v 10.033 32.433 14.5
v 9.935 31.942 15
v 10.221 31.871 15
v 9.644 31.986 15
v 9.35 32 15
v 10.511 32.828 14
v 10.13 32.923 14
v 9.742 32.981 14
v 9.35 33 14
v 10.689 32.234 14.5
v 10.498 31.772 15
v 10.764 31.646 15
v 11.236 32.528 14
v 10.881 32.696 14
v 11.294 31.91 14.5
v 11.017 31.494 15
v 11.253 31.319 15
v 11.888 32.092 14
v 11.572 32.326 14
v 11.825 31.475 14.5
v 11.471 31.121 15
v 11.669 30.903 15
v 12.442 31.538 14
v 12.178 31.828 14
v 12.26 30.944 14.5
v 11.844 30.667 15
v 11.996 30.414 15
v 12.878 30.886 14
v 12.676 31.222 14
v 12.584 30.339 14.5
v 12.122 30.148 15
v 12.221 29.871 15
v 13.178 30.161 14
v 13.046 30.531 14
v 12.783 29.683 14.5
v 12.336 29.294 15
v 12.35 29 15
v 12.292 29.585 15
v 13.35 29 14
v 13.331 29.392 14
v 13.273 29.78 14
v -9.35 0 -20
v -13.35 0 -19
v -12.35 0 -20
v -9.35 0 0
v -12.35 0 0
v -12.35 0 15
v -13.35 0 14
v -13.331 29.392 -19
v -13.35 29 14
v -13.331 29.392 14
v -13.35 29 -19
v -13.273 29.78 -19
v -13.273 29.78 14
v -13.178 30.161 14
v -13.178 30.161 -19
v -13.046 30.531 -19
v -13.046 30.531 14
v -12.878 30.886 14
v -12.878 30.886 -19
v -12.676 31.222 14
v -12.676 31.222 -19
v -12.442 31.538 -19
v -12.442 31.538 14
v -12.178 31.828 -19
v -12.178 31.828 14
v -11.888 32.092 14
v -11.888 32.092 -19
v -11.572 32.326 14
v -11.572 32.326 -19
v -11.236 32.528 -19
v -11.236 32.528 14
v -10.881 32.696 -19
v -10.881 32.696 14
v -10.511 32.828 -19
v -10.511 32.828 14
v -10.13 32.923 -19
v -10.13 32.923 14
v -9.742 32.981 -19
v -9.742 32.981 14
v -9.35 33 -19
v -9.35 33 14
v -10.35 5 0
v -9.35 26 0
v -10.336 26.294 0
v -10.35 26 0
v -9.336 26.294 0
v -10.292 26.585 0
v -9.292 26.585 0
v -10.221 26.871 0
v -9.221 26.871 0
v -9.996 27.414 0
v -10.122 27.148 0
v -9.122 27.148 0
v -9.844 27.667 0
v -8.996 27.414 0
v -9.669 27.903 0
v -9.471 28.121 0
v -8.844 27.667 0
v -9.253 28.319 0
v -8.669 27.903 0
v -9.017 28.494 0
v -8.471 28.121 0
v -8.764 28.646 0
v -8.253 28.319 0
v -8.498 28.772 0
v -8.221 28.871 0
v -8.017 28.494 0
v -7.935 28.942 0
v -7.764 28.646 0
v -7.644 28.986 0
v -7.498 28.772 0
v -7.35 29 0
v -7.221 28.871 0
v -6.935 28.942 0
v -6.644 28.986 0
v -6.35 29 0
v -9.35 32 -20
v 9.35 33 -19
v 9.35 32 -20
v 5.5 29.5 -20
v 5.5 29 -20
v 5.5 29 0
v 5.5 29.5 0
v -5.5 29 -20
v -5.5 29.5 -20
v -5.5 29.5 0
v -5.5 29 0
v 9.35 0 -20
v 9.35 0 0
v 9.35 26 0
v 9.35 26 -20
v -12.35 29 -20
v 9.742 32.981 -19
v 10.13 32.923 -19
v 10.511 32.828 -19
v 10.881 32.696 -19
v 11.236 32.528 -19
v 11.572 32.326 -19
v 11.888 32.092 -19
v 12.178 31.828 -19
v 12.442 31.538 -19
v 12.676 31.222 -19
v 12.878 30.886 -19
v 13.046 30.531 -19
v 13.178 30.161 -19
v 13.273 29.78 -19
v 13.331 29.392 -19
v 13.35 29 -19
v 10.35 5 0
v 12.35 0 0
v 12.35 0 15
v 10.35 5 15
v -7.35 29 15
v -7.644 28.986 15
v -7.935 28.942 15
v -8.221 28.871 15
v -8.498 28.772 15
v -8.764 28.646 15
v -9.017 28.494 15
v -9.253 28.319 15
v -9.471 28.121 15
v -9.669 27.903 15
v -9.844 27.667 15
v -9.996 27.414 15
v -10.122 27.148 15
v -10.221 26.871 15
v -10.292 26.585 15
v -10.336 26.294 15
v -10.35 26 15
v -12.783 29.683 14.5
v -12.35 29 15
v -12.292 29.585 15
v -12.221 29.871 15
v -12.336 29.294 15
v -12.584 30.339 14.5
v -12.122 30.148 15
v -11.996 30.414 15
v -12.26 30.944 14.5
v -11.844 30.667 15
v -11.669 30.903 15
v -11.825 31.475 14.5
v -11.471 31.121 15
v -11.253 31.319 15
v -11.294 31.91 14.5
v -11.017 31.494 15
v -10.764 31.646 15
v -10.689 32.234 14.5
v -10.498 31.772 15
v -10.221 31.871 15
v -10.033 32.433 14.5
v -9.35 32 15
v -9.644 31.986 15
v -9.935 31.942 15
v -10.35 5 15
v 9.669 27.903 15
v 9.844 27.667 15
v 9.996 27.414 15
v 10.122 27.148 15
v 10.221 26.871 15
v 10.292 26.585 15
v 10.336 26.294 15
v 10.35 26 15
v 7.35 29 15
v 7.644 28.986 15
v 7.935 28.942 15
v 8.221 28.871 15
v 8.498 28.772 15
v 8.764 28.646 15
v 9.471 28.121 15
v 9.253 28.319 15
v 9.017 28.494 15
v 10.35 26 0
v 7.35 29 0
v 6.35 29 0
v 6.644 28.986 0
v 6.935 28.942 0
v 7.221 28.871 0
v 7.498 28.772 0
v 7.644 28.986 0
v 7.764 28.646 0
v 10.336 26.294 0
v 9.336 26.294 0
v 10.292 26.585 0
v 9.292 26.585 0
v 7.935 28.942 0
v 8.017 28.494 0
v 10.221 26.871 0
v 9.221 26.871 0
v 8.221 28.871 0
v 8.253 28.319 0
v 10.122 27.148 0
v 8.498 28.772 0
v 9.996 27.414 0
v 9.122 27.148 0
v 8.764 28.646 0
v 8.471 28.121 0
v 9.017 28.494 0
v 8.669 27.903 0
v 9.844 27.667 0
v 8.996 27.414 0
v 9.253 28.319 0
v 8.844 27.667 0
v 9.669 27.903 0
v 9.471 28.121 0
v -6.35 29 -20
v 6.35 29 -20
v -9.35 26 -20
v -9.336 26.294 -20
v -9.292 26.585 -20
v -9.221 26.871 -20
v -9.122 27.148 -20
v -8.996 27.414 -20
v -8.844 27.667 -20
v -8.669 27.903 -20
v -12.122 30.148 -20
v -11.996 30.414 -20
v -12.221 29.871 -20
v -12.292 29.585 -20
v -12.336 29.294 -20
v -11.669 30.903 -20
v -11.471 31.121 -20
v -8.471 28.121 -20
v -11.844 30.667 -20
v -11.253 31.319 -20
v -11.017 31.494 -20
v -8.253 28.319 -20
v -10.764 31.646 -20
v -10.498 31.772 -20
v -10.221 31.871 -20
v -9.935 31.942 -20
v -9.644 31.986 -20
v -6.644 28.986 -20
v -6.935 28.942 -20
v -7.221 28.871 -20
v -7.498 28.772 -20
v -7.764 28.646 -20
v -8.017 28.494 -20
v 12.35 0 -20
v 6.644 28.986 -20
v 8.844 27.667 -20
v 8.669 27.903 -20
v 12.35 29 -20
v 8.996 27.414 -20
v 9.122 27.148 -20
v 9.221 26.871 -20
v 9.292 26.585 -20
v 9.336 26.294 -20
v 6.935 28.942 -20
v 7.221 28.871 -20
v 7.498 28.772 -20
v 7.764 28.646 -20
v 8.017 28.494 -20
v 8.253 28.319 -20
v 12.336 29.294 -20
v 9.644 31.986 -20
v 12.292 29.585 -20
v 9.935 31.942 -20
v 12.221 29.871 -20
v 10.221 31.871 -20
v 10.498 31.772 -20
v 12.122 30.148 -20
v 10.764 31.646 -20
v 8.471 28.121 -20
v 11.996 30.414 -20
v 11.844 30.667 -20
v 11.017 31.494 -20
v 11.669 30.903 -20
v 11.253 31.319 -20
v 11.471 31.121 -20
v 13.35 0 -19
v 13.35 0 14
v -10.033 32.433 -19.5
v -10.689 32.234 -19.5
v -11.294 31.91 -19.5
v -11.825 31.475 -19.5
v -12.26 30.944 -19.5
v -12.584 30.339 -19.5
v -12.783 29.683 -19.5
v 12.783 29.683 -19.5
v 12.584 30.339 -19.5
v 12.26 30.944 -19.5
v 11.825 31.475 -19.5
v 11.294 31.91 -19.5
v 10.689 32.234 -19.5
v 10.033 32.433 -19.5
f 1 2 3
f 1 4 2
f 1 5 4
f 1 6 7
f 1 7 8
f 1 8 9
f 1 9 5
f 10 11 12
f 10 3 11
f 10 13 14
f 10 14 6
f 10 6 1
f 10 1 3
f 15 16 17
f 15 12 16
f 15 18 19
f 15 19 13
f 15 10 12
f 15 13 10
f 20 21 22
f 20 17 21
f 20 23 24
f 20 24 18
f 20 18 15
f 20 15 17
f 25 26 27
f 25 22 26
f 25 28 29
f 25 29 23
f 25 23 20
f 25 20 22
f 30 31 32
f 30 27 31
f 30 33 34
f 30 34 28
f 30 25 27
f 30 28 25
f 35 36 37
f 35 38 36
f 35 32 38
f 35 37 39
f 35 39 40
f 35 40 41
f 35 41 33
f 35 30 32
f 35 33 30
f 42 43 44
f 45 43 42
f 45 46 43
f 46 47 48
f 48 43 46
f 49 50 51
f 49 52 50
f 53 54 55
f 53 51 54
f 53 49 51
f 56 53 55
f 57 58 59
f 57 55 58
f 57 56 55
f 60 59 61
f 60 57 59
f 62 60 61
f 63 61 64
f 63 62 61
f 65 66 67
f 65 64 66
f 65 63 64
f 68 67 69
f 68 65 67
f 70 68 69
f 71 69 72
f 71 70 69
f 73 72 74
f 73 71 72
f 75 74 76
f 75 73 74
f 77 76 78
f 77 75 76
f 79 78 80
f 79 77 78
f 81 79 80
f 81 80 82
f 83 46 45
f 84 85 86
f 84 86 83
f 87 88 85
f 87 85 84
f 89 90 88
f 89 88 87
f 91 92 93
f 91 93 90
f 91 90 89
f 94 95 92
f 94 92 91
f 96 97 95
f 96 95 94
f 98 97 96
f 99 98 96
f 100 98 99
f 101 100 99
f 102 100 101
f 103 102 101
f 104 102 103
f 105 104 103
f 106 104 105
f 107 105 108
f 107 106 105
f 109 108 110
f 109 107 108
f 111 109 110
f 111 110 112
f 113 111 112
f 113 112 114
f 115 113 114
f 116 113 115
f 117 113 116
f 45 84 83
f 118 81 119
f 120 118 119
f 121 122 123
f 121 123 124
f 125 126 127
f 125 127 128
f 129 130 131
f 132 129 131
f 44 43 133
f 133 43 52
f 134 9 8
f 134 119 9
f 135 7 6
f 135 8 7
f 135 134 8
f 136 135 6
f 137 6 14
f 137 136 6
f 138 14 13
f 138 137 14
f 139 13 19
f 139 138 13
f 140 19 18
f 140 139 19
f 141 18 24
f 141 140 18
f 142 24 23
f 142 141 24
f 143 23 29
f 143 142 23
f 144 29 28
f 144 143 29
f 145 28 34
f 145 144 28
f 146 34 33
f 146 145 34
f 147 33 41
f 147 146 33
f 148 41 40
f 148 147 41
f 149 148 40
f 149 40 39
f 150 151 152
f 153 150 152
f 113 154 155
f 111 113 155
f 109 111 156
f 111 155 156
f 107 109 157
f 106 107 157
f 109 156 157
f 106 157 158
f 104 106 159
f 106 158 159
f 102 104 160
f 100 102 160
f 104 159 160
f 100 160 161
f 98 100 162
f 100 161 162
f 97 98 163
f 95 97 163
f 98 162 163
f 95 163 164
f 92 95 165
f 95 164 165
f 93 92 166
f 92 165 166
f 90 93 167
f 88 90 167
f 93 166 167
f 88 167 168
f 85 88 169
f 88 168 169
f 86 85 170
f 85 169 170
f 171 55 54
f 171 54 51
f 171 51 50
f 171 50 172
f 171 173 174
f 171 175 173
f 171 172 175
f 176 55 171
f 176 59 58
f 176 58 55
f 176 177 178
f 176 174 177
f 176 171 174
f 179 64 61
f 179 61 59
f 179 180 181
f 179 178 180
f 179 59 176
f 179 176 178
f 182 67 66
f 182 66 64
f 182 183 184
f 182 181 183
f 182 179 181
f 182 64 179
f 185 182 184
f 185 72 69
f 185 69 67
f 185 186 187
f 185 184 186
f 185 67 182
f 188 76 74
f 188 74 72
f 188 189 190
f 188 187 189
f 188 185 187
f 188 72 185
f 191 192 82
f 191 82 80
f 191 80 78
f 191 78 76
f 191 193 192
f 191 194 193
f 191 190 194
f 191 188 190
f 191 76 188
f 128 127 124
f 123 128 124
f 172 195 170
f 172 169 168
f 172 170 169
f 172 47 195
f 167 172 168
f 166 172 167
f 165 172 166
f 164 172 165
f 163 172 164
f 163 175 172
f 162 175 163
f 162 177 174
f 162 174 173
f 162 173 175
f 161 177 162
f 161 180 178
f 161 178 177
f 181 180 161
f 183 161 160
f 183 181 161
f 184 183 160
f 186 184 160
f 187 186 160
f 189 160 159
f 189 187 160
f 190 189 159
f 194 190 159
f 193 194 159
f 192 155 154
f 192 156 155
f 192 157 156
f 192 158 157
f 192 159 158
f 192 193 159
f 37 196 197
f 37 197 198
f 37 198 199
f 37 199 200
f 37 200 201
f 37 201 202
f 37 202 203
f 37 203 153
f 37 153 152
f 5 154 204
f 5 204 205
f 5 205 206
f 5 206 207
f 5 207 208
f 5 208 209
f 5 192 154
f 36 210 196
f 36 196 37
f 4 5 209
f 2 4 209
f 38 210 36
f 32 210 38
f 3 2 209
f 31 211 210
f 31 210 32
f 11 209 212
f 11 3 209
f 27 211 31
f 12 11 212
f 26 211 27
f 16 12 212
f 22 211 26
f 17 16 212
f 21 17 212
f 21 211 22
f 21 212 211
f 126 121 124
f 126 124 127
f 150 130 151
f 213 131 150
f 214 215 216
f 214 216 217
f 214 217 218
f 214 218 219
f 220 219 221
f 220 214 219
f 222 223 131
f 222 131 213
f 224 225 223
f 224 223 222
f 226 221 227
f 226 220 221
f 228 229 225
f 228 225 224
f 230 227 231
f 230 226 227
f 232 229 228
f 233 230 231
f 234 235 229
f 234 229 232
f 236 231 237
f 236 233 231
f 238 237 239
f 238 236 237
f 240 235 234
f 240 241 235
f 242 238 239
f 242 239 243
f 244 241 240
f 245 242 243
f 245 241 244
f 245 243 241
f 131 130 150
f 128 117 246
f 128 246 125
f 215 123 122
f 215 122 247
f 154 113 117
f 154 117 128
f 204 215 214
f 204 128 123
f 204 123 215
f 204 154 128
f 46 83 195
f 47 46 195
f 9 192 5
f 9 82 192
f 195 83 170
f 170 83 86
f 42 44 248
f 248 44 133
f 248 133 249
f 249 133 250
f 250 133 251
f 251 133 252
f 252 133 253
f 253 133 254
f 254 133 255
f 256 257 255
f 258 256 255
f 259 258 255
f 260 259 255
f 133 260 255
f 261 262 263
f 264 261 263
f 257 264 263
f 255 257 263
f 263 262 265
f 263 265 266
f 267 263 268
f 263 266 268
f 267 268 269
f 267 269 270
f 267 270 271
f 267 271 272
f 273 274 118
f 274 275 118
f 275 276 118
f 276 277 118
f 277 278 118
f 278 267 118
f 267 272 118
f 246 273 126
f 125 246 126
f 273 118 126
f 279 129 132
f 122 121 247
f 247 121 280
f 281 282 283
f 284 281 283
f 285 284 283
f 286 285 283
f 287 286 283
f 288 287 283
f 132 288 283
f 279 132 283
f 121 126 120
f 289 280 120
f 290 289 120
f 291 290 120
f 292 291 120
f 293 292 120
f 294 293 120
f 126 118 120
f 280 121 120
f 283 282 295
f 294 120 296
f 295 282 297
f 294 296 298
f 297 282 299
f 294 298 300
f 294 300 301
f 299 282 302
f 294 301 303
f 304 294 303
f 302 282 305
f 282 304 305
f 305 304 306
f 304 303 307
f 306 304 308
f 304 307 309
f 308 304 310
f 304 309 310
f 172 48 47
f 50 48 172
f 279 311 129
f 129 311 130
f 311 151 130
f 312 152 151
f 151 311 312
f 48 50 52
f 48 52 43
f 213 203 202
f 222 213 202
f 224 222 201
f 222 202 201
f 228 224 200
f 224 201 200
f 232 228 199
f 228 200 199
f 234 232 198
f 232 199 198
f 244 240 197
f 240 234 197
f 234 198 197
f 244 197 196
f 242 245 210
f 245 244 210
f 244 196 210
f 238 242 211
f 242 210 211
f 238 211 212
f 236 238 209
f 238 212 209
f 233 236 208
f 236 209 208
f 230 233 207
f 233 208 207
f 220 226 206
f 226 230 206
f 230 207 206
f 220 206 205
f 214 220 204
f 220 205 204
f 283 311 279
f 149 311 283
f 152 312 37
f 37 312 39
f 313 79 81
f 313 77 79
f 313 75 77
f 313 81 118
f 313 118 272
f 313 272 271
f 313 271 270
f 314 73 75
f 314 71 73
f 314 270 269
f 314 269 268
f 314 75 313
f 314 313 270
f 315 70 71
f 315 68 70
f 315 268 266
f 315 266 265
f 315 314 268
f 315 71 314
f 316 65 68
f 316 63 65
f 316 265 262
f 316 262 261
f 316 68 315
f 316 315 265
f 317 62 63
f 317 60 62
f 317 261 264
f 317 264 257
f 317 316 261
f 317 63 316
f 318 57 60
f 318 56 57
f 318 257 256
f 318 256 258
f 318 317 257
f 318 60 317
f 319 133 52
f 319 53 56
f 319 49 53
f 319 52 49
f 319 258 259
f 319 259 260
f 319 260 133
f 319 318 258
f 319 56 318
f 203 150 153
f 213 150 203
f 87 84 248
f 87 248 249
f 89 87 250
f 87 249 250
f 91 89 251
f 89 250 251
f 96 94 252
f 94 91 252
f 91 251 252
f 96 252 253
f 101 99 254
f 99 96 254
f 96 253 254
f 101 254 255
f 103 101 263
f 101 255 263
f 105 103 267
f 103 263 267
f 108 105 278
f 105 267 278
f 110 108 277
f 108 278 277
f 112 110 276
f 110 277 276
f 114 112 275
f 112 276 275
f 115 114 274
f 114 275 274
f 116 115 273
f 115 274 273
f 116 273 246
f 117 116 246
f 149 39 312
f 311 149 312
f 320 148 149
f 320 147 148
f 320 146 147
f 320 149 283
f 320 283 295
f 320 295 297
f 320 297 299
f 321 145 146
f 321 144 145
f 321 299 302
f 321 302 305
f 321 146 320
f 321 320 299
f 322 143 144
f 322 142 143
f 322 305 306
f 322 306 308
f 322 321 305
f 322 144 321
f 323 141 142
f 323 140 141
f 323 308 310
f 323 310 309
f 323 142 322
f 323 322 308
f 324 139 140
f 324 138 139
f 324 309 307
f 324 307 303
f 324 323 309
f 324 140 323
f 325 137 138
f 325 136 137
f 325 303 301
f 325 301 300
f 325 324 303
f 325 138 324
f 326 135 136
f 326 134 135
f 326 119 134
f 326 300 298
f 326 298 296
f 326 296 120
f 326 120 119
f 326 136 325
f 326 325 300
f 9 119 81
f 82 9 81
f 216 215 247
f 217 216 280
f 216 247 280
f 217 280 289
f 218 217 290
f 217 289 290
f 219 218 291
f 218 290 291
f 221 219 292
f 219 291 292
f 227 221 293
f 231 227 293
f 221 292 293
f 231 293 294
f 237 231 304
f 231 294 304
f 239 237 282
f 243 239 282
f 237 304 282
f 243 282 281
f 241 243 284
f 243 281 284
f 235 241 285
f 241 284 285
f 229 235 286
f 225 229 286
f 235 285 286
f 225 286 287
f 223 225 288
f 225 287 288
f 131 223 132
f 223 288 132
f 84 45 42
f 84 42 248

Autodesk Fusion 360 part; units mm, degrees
sketch "Sketch1" plane through (0, 0, 0) normal (0, 0, 1) x (1, 0, 0)
  line L0 (-9.35, 0) -> (-9.35, 29)
  line L1 (-10.35, 29) -> (0, 29)
  line L2 (0, 33) -> (-13.35, 33)
  line L3 (-13.35, 33) -> (-13.35, 0)
  line L4 (-13.35, 0) -> (-9.35, 0)
  line L5 (-10.35, 0) -> (-10.35, 29)
  line L6 (0, 2.5) -> (0, 20)
  line L7 (13.35, 0) -> (9.35, 0)
  line L8 (0, 33) -> (13.35, 33)
  line L9 (13.35, 33) -> (13.35, 0)
  line L10 (10.35, 0) -> (10.35, 29)
  line L11 (10.35, 29) -> (0, 29)
  line L12 (9.35, 0) -> (9.35, 29)
  line L13 (5.5, 29.5) -> (-5.5, 29.5)
  line L14 (-5.5, 29.5) -> (-5.5, 28.5)
  line L15 (-5.5, 28.5) -> (5.5, 28.5)
  line L16 (5.5, 28.5) -> (5.5, 29.5)
  line L17 (5.5, 29.5) -> (-5.5, 28.5) construction
  line L18 (-5.5, 29.5) -> (5.5, 28.5) construction
  point P0 (0, 29)
  dimension "d1" = 9.35
  dimension "d3" = 4
  dimension "d4" = 4
  dimension "d5" = 29
  dimension "d18" = 1
  dimension "d19" = 11
  dimension "d20" = 1
extrude "Extrude1" add sketch "Sketch1" against normal blind 20 contours L0 L1 L4 L5 | L1 L2 L3 L4 L5 L7 L8 L9 L10 L11 L13 L14 L16 | L7 L10 L11 L12
extrude "Extrude2" add sketch "Sketch1" along normal blind 15 contours L1 L2 L3 L4 L5 L7 L8 L9 L10 L11 L13 L14 L16 | L1 L11 L13 L14 L16
chamfer "Chamfer1" distance 2 distance2 5 1 edges at (-10.35, 0, 7.5) measured on face at (-11.0167, 0, -13.3333)
chamfer "Chamfer1" distance 5 distance2 2 1 edges at (10.35, 0, 7.5) measured on face at (10.35, 9.6667, 5)
fillet "Fillet1" radius 4 2 edges at (-13.35, 33, -2.5) (13.35, 33, -2.5)
fillet "Fillet2" radius 3 4 edges at (-9.35, 29, -10) (-10.35, 29, 7.5) (9.35, 29, -10) (10.35, 29, 7.5)
chamfer "Chamfer3" distance 1 angle 45 10 edges at (-13.35, 14.5, -20) (-12.1784, 31.8284, -20) (0, 33, -20) (12.1784, 31.8284, -20) (13.35, 14.5, -20) (-13.35, 14.5, 15) (13.35, 14.5, 15) (12.1784, 31.8284, 15) (0, 33, 15) (-12.1784, 31.8284, 15)
equation "d1 = ( 18.7 / 2 ) * 1 mm"
equation "w = 4 mm"
